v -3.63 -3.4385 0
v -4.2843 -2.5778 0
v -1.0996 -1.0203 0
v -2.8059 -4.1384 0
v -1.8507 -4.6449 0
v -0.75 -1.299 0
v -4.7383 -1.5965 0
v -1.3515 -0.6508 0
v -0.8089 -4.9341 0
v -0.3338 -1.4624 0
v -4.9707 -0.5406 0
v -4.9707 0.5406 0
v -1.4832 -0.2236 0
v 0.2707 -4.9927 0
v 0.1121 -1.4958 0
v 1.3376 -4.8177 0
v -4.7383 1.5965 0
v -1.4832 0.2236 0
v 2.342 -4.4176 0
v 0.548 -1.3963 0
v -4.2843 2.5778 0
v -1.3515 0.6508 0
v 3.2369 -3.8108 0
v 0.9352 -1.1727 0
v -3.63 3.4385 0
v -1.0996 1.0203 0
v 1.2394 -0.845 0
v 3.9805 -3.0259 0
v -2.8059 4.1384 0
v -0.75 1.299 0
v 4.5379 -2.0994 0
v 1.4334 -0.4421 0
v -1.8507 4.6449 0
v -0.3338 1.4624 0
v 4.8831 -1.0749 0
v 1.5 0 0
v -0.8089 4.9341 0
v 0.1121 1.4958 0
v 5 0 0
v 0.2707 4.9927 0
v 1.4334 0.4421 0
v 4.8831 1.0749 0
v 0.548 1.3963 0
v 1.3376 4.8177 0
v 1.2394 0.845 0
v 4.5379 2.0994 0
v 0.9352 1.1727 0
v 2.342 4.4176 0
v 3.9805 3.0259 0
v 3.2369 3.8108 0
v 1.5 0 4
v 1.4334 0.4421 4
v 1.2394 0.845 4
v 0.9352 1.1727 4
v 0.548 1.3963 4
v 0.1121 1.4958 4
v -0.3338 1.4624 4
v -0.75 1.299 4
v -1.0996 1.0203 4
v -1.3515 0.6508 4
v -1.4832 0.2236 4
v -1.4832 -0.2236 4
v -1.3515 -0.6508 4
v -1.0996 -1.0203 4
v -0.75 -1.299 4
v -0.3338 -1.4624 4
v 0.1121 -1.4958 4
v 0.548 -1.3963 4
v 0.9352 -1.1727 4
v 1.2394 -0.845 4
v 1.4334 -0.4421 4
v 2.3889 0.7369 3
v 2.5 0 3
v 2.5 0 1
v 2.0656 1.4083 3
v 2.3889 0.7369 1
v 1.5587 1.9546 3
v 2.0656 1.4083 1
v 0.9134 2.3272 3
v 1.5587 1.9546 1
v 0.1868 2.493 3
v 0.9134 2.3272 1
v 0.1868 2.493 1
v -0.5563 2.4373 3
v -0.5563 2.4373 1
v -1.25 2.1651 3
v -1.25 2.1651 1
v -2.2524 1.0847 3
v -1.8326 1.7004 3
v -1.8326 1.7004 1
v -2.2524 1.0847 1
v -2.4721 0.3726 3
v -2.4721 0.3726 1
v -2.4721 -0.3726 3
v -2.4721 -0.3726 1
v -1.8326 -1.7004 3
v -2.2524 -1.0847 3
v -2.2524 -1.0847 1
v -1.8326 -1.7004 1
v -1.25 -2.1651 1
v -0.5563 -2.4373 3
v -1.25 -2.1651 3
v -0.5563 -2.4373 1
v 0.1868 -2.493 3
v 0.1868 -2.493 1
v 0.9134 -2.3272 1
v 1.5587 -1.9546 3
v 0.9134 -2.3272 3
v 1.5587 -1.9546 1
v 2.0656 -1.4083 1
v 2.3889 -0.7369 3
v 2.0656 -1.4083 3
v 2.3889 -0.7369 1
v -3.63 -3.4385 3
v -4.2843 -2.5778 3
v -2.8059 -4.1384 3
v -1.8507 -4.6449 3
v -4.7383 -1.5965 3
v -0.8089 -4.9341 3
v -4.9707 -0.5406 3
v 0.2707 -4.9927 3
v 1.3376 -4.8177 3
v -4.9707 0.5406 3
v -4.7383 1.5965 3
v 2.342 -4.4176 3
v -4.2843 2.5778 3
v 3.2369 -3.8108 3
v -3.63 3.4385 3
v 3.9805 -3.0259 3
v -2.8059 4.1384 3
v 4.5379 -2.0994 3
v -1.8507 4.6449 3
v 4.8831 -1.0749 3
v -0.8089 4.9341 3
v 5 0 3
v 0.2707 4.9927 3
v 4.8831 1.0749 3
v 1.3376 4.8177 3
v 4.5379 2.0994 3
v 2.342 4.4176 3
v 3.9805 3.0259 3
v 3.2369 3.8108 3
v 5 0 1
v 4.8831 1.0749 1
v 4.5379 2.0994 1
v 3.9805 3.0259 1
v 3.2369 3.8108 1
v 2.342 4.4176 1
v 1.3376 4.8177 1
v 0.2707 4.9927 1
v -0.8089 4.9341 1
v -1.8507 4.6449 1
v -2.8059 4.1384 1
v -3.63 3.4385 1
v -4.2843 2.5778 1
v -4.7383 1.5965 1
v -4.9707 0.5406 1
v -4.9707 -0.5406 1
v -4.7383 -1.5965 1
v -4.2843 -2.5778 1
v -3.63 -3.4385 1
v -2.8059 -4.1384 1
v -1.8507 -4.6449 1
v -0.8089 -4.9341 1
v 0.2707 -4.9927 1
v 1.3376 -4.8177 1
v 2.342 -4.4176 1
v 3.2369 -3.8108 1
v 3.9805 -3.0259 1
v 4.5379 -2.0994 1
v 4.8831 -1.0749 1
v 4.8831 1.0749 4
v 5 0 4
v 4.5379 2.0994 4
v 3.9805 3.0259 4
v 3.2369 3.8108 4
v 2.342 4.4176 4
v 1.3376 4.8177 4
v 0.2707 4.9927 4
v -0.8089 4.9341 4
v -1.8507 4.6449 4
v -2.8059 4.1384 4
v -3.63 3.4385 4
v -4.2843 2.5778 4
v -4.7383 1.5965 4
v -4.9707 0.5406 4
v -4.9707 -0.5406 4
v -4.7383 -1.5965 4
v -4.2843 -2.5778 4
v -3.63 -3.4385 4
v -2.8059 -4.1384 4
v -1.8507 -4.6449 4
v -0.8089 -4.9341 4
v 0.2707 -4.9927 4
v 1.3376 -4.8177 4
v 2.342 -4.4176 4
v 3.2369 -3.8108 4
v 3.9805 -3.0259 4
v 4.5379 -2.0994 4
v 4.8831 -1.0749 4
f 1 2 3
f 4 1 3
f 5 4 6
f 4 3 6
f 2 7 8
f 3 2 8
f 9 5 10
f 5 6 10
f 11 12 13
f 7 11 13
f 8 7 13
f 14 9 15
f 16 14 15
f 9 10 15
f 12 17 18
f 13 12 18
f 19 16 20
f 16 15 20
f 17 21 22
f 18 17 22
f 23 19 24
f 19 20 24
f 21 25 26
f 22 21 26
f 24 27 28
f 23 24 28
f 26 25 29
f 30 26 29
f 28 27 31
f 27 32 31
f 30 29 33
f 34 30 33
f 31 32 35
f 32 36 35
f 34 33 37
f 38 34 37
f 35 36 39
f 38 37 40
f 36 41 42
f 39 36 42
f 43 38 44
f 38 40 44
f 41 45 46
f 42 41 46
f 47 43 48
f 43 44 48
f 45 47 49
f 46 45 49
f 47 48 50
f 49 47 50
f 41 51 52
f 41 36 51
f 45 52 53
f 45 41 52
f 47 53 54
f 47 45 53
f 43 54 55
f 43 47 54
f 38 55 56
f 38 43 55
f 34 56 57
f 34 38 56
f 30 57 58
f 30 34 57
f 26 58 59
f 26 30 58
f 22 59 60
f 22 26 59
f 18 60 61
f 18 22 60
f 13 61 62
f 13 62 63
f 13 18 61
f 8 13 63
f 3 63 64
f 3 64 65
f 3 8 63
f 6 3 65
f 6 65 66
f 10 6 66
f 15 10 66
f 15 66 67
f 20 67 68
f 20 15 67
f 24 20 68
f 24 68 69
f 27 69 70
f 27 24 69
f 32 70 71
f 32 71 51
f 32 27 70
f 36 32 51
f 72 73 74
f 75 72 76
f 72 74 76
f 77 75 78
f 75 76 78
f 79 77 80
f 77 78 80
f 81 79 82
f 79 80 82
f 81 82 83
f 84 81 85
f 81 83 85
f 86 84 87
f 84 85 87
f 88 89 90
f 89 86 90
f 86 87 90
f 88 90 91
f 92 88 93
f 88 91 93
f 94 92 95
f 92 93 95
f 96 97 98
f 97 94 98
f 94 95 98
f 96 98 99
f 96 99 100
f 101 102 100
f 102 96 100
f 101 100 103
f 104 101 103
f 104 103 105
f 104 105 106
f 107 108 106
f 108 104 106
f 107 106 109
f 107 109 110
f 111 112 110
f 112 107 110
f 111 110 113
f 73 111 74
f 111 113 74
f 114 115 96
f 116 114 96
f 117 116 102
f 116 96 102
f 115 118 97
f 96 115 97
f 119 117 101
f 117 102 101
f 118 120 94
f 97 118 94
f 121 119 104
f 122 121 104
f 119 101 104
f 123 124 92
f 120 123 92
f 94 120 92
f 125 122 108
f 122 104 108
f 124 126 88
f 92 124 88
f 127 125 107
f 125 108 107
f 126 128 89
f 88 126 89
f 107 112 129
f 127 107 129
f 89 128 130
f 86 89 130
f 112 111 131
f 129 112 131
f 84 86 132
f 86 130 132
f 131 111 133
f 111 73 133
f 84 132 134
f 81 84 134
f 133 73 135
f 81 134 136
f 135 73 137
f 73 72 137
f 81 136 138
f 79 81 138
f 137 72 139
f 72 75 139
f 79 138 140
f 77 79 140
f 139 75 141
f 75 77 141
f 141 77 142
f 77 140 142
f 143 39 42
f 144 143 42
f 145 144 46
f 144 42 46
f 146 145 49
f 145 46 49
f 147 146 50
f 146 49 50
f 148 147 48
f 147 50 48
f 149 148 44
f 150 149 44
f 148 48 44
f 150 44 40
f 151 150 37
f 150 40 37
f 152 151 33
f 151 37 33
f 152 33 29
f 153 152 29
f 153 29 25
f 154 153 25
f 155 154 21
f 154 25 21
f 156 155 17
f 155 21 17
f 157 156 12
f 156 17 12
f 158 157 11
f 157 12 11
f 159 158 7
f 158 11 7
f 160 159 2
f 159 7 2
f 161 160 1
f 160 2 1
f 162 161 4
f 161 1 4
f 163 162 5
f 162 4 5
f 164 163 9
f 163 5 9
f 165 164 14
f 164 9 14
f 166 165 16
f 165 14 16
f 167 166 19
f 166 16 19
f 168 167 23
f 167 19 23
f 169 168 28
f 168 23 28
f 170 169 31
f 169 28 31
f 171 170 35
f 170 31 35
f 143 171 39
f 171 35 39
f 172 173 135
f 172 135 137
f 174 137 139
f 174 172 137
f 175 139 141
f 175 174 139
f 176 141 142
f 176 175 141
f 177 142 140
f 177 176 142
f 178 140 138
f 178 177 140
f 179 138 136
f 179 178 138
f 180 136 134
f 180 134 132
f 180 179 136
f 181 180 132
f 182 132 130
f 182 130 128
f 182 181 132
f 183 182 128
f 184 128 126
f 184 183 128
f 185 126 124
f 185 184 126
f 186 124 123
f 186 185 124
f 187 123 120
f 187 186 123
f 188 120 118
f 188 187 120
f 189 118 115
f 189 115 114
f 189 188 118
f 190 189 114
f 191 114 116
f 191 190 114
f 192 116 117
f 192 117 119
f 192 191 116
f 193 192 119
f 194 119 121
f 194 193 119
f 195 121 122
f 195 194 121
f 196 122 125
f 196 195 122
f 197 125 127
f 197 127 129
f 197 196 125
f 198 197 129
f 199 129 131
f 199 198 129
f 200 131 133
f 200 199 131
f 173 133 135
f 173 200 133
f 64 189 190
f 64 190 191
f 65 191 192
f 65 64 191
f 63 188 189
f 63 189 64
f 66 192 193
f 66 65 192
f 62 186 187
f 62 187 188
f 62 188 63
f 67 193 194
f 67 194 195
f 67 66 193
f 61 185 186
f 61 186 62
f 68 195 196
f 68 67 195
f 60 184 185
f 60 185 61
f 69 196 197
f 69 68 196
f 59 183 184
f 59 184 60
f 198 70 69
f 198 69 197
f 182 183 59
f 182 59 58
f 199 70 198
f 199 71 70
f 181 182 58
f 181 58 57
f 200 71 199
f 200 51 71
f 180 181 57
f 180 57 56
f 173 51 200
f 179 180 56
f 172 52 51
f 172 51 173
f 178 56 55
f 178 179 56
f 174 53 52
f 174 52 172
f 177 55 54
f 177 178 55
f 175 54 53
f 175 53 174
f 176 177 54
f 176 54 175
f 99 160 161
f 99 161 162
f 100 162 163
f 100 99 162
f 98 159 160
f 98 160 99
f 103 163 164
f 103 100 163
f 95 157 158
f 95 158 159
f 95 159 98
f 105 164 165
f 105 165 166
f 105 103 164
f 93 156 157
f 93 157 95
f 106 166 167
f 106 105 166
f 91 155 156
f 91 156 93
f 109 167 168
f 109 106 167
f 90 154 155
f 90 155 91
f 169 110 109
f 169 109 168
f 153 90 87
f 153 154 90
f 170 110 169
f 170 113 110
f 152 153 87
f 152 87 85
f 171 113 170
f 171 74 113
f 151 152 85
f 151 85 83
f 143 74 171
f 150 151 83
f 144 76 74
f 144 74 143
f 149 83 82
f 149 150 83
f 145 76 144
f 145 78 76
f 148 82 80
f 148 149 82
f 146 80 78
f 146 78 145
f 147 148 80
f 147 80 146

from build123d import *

# Parameters (mm, degrees)
F0_R     = 2.5
F0_R_2   = 1.5
F1_DEPTH = 4
F0_R_3   = 5
F2_DEPTH = 1
F3_R     = 5
F3_R_2   = 2.5
F3_R_3   = 1.5
F4_DEPTH = 1


with BuildPart() as f1:
    # F0 (on Top) → F1 (new body)
    with BuildSketch(Plane.XY):
        Circle(F0_R)
        Circle(F0_R_2, mode=Mode.SUBTRACT)
    extrude(amount=F1_DEPTH)

    # F0 (on Top) → F2 (join)
    with BuildSketch(Plane.XY):
        Circle(F0_R_3)
        Circle(F0_R, mode=Mode.SUBTRACT)
    extrude(amount=F2_DEPTH)

    # F3 (on face) → F4 (join)
    with BuildSketch(Plane.XY.offset(4)):
        Circle(F3_R)
        Circle(F3_R_2, mode=Mode.SUBTRACT)
        Circle(F3_R_2)
        Circle(F3_R_3, mode=Mode.SUBTRACT)
    extrude(amount=-F4_DEPTH)


solid = f1.part
